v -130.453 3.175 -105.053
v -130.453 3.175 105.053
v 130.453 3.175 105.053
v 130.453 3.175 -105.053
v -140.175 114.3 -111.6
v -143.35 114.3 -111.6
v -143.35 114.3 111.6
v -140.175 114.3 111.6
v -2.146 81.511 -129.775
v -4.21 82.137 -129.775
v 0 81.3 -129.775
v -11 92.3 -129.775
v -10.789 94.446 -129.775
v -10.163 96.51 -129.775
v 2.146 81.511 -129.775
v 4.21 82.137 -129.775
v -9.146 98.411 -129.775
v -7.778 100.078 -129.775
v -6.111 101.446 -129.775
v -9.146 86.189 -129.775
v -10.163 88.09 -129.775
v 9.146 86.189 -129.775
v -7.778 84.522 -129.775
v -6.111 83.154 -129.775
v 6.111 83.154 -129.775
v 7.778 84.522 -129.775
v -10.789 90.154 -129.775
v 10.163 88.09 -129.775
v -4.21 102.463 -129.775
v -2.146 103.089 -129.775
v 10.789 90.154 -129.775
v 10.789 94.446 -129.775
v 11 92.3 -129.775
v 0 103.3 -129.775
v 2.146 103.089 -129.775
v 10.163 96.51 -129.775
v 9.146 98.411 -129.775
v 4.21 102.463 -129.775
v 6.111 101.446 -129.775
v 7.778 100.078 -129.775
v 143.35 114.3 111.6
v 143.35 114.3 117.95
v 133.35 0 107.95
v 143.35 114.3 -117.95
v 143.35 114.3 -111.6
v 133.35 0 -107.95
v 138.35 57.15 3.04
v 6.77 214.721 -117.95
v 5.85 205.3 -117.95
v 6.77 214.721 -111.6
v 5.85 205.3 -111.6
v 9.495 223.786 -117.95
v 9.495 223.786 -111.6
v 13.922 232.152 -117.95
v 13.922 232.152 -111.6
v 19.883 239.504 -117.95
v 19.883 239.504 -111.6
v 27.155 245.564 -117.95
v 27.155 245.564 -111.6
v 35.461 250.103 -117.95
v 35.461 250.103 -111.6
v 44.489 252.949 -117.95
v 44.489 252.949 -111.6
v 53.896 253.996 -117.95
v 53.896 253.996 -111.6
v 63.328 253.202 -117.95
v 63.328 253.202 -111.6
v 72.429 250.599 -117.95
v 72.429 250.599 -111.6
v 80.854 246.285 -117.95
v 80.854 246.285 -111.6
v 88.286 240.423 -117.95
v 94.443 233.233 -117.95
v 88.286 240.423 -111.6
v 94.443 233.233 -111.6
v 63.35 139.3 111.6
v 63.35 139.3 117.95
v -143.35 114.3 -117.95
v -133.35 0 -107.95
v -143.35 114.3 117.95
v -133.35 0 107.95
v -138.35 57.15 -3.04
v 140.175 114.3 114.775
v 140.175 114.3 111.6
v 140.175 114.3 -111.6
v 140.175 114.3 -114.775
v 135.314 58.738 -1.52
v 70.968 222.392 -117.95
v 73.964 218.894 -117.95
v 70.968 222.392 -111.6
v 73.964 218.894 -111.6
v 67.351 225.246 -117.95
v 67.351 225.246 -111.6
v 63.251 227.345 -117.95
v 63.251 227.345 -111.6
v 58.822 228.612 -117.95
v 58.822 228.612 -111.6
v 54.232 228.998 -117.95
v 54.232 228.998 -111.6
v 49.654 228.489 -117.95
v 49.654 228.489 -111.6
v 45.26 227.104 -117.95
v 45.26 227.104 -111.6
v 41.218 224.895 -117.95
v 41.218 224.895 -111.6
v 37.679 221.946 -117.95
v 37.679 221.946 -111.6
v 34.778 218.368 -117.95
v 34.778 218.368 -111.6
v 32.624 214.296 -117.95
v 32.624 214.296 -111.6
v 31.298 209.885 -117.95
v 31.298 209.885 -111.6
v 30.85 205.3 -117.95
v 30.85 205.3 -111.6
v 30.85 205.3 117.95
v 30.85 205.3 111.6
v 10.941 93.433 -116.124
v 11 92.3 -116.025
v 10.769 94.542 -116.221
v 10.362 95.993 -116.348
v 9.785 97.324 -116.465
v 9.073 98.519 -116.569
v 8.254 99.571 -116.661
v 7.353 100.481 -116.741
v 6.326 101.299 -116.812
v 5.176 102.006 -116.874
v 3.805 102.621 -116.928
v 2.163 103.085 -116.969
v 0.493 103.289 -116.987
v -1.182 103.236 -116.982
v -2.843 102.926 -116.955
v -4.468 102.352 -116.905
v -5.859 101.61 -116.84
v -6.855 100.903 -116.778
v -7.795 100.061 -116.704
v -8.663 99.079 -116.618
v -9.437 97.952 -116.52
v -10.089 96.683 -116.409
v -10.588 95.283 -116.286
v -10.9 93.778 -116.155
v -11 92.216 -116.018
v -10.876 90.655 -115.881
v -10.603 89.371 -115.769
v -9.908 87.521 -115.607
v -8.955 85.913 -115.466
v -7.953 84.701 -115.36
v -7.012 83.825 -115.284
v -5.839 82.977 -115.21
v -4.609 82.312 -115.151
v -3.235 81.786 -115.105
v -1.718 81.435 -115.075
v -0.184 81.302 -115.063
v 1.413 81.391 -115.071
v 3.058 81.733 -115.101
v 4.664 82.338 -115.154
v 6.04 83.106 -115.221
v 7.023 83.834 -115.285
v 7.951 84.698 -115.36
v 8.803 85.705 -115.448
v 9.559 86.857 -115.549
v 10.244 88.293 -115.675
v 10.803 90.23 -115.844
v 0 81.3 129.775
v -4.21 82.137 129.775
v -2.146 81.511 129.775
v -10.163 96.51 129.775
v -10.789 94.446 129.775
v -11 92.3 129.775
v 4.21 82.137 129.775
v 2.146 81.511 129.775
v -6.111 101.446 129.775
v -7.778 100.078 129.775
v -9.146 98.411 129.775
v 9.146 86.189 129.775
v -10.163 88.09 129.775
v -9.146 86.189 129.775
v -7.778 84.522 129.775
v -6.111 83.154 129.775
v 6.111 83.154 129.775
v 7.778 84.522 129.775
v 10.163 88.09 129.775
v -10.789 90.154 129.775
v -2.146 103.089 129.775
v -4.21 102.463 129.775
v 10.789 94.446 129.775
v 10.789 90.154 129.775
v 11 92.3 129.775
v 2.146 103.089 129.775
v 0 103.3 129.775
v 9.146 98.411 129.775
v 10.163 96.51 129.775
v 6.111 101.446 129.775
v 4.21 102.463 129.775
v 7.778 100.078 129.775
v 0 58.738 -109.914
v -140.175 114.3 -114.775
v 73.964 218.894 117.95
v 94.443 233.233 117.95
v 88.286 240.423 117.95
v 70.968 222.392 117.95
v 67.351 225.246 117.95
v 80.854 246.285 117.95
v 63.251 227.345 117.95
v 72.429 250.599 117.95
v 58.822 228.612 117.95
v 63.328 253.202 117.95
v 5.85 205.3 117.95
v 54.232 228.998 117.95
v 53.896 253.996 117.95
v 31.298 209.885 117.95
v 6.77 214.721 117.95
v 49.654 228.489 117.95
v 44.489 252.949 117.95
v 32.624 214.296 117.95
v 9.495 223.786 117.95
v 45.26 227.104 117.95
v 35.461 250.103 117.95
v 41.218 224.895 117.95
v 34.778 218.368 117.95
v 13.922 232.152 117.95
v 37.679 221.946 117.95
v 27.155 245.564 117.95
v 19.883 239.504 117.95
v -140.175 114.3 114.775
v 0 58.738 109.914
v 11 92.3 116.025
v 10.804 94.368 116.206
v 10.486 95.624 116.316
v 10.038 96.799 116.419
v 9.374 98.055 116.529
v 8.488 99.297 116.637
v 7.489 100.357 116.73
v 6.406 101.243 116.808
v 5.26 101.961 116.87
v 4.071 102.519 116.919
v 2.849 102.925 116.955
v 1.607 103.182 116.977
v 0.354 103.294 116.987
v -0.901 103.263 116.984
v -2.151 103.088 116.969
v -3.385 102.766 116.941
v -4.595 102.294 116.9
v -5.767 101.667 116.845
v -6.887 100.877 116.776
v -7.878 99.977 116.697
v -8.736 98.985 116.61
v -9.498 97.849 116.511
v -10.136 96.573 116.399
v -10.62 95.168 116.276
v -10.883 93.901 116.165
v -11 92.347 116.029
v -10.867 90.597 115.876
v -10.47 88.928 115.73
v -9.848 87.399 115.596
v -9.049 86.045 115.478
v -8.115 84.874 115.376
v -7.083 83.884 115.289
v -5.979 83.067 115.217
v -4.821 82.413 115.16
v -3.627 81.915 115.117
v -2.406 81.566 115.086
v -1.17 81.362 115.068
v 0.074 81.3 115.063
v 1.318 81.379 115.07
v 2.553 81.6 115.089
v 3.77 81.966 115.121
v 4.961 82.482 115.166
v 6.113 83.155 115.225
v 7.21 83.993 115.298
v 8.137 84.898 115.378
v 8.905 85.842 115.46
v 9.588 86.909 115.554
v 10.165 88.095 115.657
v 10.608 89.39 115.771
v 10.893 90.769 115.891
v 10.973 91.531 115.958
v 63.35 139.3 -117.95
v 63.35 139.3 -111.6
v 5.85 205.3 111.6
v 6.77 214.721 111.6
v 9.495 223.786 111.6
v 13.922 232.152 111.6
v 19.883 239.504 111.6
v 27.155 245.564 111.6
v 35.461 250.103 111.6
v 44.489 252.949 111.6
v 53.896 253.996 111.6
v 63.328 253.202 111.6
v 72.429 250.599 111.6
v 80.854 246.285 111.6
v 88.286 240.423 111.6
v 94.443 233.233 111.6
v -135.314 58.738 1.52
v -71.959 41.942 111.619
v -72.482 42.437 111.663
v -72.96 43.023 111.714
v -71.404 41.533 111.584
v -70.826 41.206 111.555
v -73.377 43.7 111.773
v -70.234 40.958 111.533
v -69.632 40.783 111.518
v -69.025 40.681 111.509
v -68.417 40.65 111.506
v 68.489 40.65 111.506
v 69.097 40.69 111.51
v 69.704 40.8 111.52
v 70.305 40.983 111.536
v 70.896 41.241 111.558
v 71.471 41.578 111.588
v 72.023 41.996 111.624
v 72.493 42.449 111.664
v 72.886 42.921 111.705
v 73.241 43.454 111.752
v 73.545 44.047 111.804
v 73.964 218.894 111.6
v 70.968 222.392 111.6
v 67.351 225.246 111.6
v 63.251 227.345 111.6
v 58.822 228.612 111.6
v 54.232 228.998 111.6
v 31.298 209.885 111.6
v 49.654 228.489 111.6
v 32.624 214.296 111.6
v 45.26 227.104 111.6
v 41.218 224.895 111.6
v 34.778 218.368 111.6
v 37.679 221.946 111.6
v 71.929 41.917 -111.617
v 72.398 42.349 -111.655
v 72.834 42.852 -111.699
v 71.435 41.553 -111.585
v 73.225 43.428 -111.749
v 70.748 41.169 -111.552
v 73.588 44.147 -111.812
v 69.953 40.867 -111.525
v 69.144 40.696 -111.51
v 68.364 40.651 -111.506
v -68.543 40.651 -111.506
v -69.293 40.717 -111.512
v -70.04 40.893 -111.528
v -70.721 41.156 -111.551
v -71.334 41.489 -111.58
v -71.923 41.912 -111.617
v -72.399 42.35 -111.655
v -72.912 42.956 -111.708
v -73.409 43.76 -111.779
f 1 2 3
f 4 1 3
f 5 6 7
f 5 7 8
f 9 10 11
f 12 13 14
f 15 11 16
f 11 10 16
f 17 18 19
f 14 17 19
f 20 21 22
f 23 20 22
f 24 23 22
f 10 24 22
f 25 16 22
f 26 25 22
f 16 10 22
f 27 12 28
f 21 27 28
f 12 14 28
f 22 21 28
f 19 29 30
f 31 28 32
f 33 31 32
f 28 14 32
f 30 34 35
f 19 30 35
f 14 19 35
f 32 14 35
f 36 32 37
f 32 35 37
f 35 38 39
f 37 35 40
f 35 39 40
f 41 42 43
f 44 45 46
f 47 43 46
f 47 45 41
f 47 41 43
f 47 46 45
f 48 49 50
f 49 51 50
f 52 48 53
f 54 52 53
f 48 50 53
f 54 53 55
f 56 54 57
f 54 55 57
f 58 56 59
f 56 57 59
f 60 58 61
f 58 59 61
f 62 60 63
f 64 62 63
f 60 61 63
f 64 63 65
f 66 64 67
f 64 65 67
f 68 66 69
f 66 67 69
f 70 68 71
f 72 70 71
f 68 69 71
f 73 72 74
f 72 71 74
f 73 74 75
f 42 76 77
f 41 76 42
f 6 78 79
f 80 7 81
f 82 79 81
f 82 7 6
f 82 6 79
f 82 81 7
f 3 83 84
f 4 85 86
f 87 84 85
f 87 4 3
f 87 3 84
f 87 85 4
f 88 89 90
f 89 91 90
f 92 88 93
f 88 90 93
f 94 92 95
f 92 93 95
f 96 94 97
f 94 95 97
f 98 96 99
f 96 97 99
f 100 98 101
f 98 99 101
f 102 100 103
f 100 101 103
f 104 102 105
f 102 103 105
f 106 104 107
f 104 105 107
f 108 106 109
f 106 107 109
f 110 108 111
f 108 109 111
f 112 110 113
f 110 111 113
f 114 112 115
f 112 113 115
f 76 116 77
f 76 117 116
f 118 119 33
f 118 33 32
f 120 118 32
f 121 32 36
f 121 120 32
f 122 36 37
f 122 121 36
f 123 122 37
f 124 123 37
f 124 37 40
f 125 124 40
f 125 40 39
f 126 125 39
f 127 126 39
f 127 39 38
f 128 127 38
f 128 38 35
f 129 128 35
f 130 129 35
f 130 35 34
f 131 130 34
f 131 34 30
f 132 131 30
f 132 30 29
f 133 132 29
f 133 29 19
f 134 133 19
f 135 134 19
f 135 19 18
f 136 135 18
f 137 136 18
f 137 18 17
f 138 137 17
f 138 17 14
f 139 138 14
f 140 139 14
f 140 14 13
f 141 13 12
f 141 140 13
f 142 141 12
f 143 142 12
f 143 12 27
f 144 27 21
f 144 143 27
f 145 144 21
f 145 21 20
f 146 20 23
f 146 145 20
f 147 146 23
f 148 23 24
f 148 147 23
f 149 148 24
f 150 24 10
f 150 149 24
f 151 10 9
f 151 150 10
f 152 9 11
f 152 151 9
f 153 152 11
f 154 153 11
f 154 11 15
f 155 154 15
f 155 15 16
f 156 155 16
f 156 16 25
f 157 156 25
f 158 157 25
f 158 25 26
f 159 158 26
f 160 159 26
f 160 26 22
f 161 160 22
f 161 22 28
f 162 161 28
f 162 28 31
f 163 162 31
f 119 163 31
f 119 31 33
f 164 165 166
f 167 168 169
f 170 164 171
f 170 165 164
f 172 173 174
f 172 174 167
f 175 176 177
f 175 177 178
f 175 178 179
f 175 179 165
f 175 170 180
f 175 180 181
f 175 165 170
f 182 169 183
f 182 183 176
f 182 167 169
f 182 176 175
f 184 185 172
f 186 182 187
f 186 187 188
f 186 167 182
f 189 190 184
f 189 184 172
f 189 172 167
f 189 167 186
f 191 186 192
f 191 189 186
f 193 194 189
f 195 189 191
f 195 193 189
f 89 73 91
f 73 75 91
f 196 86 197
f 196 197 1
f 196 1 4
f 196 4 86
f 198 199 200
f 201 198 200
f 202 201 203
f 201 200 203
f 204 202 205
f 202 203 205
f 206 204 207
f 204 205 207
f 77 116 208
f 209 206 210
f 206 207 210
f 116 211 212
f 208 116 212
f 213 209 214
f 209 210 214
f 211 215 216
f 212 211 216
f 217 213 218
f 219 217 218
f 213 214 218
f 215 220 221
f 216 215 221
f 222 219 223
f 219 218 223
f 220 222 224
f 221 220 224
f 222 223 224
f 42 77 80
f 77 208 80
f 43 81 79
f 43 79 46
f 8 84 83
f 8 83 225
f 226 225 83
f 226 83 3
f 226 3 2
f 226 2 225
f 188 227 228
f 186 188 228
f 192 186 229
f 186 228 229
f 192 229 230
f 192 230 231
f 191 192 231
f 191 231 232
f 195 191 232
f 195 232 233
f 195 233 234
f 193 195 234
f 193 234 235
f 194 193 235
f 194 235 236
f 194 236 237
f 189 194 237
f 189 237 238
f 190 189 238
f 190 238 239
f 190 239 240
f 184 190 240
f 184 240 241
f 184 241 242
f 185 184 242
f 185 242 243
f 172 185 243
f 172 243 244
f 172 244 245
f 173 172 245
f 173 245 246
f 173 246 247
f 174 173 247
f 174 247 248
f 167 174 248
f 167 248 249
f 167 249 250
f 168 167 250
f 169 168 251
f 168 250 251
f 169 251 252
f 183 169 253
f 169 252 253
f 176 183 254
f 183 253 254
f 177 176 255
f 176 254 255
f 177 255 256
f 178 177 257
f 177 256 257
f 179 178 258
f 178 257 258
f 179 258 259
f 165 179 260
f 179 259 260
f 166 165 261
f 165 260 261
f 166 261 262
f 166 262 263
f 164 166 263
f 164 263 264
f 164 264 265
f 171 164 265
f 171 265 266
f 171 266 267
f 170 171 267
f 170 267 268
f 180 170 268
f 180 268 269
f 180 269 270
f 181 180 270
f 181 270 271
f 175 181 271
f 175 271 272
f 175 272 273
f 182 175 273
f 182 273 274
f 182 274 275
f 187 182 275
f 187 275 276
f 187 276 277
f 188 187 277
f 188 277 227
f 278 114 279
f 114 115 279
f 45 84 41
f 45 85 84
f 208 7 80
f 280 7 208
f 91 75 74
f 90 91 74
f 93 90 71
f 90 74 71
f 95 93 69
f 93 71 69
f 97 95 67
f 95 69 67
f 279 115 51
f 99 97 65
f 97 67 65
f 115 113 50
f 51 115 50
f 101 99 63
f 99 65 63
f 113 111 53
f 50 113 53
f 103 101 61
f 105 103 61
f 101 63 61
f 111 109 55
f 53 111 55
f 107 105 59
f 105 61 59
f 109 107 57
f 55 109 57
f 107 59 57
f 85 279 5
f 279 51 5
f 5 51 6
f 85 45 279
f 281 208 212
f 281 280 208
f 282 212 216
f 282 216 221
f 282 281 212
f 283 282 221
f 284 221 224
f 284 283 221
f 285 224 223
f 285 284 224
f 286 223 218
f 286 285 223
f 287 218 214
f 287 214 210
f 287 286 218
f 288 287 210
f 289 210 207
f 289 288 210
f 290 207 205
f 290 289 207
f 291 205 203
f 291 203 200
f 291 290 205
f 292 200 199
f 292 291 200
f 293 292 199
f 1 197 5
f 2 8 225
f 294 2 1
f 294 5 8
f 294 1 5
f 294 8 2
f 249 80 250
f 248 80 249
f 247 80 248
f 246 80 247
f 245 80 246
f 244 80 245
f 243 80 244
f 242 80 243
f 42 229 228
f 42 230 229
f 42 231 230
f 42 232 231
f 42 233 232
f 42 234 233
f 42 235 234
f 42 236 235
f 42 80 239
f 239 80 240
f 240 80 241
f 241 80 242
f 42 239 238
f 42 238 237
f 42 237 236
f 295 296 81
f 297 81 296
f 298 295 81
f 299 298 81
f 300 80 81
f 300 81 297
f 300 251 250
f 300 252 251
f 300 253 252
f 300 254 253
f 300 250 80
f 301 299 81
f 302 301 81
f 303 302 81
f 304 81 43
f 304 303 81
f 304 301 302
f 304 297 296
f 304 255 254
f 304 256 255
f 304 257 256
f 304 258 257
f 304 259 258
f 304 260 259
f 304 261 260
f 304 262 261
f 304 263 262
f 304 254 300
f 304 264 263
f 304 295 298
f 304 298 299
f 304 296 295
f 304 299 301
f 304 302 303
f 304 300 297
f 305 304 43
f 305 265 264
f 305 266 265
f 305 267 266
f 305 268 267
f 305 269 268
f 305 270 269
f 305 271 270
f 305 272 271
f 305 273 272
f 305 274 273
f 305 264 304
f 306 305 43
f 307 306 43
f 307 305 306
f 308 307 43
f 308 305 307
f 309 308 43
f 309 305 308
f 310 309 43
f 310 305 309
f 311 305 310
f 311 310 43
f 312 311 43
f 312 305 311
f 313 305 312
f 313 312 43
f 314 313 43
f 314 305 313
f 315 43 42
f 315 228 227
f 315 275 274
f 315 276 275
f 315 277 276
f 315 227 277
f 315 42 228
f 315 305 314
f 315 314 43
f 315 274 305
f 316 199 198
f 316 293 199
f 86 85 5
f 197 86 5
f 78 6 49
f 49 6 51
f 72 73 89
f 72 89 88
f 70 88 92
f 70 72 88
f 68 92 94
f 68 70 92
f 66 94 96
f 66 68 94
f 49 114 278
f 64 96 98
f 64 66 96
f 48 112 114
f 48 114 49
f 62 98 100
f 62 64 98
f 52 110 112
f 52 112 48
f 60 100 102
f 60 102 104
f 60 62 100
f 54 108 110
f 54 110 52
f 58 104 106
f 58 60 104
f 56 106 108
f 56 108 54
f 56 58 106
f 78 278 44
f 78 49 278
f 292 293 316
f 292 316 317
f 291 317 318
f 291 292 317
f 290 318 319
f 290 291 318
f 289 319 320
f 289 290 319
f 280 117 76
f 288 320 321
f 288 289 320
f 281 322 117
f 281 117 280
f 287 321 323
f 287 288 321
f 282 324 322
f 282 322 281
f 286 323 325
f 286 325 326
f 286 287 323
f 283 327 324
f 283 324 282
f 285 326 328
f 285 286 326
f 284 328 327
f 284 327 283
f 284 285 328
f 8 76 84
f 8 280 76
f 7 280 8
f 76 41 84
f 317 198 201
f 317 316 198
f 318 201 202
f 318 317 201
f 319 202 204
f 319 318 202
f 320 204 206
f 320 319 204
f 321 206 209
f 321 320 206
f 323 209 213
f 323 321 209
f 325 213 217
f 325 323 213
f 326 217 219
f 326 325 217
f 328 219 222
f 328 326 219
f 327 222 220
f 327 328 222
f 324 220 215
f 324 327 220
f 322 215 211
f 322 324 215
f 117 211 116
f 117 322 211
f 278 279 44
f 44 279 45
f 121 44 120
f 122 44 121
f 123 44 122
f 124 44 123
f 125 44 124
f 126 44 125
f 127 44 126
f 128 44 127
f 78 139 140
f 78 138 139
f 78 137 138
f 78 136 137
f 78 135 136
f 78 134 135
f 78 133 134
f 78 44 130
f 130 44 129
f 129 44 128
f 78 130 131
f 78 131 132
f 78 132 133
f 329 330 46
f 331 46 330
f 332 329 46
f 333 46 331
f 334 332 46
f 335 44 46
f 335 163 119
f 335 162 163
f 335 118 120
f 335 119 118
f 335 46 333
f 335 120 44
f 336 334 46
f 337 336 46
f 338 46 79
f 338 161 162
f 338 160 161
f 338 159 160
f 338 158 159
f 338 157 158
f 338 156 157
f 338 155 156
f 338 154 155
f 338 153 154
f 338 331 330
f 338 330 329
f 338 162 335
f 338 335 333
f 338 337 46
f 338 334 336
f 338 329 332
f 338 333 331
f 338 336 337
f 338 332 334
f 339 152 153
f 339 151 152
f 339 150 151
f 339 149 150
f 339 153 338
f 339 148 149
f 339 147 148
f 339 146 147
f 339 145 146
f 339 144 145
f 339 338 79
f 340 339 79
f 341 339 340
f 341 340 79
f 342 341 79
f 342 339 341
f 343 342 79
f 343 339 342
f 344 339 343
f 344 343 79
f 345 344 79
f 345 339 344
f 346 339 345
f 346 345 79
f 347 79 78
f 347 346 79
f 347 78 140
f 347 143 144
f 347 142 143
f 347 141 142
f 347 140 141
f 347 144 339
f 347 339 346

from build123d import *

# Parameters (mm, degrees)
SKETCH1_W           = 266.7
SKETCH1_H           = 215.9
SKETCH1_W_2         = 260.35
SKETCH1_H_2         = 209.55
BOSS_EXTRUDE1_DEPTH = 114.3
BOSS_EXTRUDE1_TAPER = -5
SKETCH1_5_W         = 260.35
SKETCH1_5_H         = 209.55
BOSS_EXTRUDE2_DEPTH = 3.175
BOSS_EXTRUDE2_TAPER = -5
SKETCH3_W           = 280.349908482
SKETCH3_H           = 229.549908482
SKETCH3_W_2         = 240.350091518
SKETCH3_H_2         = 189.550091518
CUT_EXTRUDE1_DEPTH  = 111.125
CUT_EXTRUDE1_TAPER  = 5
BOSS_EXTRUDE3_START = -114.774954
BOSS_EXTRUDE3_DEPTH = 3.175
BOSS_EXTRUDE4_START = -114.774954
SKETCH7_R           = 11
BOSS_EXTRUDE4_DEPTH = 15


with BuildPart() as part:
    # Sketch1 → Boss-Extrude1 (new body)
    with BuildSketch(Plane(origin=(0, 0, 0), x_dir=(1, 0, 0), z_dir=(0, 1, 0))):
        Rectangle(SKETCH1_W, SKETCH1_H)
        Rectangle(SKETCH1_W_2, SKETCH1_H_2, mode=Mode.SUBTRACT)
    extrude(amount=BOSS_EXTRUDE1_DEPTH, taper=BOSS_EXTRUDE1_TAPER)

    # Sketch1<5> → Boss-Extrude2 (add)
    with BuildSketch(Plane(origin=(0, 0, 0), x_dir=(1, 0, 0), z_dir=(0, 1, 0))):
        Rectangle(SKETCH1_5_W, SKETCH1_5_H)
    extrude(amount=BOSS_EXTRUDE2_DEPTH, taper=BOSS_EXTRUDE2_TAPER)

    # Sketch3 → Cut-Extrude1 (cut)
    with BuildSketch(Plane(origin=(0, 114.3, 0), x_dir=(1, 0, 0), z_dir=(0, 1, 0))):
        Rectangle(SKETCH3_W, SKETCH3_H)
        Rectangle(SKETCH3_W_2, SKETCH3_H_2, mode=Mode.SUBTRACT)
    extrude(amount=-CUT_EXTRUDE1_DEPTH, taper=CUT_EXTRUDE1_TAPER, mode=Mode.SUBTRACT)

    # Sketch5 → Boss-Extrude3 (add, symmetric)
    with BuildSketch(Plane.XY.offset(BOSS_EXTRUDE3_START)):
        with BuildLine():
            Line((-143.349954241, 114.3), (5.849954241, 205.3))
            ThreePointArc((5.849954241, 205.3), (39.905581805, 251.746015501), (94.442658798, 233.23317245))
            Line((94.442658798, 233.23317245), (73.963857691, 218.893761542))
            ThreePointArc((73.963857691, 218.893761542), (47.423226793, 227.903091733), (30.849954241, 205.3))
            Line((30.849954241, 205.3), (63.349954241, 139.3))
            Line((63.349954241, 139.3), (143.349954241, 114.3))
            Line((143.349954241, 114.3), (-143.349954241, 114.3))
        make_face()
    boss_extrude3 = extrude(amount=BOSS_EXTRUDE3_DEPTH, both=True)

    # Sketch7 → Boss-Extrude4 (add)
    with BuildSketch(Plane.XY.offset(BOSS_EXTRUDE4_START)):
        with Locations((0, 92.3)):
            Circle(SKETCH7_R)
    boss_extrude4 = extrude(amount=-BOSS_EXTRUDE4_DEPTH)

    # Mirror5: Boss-Extrude3, Boss-Extrude4 across plane
    add(boss_extrude3.mirror(Plane.XY))
    add(boss_extrude4.mirror(Plane.XY))


solid = part.part
